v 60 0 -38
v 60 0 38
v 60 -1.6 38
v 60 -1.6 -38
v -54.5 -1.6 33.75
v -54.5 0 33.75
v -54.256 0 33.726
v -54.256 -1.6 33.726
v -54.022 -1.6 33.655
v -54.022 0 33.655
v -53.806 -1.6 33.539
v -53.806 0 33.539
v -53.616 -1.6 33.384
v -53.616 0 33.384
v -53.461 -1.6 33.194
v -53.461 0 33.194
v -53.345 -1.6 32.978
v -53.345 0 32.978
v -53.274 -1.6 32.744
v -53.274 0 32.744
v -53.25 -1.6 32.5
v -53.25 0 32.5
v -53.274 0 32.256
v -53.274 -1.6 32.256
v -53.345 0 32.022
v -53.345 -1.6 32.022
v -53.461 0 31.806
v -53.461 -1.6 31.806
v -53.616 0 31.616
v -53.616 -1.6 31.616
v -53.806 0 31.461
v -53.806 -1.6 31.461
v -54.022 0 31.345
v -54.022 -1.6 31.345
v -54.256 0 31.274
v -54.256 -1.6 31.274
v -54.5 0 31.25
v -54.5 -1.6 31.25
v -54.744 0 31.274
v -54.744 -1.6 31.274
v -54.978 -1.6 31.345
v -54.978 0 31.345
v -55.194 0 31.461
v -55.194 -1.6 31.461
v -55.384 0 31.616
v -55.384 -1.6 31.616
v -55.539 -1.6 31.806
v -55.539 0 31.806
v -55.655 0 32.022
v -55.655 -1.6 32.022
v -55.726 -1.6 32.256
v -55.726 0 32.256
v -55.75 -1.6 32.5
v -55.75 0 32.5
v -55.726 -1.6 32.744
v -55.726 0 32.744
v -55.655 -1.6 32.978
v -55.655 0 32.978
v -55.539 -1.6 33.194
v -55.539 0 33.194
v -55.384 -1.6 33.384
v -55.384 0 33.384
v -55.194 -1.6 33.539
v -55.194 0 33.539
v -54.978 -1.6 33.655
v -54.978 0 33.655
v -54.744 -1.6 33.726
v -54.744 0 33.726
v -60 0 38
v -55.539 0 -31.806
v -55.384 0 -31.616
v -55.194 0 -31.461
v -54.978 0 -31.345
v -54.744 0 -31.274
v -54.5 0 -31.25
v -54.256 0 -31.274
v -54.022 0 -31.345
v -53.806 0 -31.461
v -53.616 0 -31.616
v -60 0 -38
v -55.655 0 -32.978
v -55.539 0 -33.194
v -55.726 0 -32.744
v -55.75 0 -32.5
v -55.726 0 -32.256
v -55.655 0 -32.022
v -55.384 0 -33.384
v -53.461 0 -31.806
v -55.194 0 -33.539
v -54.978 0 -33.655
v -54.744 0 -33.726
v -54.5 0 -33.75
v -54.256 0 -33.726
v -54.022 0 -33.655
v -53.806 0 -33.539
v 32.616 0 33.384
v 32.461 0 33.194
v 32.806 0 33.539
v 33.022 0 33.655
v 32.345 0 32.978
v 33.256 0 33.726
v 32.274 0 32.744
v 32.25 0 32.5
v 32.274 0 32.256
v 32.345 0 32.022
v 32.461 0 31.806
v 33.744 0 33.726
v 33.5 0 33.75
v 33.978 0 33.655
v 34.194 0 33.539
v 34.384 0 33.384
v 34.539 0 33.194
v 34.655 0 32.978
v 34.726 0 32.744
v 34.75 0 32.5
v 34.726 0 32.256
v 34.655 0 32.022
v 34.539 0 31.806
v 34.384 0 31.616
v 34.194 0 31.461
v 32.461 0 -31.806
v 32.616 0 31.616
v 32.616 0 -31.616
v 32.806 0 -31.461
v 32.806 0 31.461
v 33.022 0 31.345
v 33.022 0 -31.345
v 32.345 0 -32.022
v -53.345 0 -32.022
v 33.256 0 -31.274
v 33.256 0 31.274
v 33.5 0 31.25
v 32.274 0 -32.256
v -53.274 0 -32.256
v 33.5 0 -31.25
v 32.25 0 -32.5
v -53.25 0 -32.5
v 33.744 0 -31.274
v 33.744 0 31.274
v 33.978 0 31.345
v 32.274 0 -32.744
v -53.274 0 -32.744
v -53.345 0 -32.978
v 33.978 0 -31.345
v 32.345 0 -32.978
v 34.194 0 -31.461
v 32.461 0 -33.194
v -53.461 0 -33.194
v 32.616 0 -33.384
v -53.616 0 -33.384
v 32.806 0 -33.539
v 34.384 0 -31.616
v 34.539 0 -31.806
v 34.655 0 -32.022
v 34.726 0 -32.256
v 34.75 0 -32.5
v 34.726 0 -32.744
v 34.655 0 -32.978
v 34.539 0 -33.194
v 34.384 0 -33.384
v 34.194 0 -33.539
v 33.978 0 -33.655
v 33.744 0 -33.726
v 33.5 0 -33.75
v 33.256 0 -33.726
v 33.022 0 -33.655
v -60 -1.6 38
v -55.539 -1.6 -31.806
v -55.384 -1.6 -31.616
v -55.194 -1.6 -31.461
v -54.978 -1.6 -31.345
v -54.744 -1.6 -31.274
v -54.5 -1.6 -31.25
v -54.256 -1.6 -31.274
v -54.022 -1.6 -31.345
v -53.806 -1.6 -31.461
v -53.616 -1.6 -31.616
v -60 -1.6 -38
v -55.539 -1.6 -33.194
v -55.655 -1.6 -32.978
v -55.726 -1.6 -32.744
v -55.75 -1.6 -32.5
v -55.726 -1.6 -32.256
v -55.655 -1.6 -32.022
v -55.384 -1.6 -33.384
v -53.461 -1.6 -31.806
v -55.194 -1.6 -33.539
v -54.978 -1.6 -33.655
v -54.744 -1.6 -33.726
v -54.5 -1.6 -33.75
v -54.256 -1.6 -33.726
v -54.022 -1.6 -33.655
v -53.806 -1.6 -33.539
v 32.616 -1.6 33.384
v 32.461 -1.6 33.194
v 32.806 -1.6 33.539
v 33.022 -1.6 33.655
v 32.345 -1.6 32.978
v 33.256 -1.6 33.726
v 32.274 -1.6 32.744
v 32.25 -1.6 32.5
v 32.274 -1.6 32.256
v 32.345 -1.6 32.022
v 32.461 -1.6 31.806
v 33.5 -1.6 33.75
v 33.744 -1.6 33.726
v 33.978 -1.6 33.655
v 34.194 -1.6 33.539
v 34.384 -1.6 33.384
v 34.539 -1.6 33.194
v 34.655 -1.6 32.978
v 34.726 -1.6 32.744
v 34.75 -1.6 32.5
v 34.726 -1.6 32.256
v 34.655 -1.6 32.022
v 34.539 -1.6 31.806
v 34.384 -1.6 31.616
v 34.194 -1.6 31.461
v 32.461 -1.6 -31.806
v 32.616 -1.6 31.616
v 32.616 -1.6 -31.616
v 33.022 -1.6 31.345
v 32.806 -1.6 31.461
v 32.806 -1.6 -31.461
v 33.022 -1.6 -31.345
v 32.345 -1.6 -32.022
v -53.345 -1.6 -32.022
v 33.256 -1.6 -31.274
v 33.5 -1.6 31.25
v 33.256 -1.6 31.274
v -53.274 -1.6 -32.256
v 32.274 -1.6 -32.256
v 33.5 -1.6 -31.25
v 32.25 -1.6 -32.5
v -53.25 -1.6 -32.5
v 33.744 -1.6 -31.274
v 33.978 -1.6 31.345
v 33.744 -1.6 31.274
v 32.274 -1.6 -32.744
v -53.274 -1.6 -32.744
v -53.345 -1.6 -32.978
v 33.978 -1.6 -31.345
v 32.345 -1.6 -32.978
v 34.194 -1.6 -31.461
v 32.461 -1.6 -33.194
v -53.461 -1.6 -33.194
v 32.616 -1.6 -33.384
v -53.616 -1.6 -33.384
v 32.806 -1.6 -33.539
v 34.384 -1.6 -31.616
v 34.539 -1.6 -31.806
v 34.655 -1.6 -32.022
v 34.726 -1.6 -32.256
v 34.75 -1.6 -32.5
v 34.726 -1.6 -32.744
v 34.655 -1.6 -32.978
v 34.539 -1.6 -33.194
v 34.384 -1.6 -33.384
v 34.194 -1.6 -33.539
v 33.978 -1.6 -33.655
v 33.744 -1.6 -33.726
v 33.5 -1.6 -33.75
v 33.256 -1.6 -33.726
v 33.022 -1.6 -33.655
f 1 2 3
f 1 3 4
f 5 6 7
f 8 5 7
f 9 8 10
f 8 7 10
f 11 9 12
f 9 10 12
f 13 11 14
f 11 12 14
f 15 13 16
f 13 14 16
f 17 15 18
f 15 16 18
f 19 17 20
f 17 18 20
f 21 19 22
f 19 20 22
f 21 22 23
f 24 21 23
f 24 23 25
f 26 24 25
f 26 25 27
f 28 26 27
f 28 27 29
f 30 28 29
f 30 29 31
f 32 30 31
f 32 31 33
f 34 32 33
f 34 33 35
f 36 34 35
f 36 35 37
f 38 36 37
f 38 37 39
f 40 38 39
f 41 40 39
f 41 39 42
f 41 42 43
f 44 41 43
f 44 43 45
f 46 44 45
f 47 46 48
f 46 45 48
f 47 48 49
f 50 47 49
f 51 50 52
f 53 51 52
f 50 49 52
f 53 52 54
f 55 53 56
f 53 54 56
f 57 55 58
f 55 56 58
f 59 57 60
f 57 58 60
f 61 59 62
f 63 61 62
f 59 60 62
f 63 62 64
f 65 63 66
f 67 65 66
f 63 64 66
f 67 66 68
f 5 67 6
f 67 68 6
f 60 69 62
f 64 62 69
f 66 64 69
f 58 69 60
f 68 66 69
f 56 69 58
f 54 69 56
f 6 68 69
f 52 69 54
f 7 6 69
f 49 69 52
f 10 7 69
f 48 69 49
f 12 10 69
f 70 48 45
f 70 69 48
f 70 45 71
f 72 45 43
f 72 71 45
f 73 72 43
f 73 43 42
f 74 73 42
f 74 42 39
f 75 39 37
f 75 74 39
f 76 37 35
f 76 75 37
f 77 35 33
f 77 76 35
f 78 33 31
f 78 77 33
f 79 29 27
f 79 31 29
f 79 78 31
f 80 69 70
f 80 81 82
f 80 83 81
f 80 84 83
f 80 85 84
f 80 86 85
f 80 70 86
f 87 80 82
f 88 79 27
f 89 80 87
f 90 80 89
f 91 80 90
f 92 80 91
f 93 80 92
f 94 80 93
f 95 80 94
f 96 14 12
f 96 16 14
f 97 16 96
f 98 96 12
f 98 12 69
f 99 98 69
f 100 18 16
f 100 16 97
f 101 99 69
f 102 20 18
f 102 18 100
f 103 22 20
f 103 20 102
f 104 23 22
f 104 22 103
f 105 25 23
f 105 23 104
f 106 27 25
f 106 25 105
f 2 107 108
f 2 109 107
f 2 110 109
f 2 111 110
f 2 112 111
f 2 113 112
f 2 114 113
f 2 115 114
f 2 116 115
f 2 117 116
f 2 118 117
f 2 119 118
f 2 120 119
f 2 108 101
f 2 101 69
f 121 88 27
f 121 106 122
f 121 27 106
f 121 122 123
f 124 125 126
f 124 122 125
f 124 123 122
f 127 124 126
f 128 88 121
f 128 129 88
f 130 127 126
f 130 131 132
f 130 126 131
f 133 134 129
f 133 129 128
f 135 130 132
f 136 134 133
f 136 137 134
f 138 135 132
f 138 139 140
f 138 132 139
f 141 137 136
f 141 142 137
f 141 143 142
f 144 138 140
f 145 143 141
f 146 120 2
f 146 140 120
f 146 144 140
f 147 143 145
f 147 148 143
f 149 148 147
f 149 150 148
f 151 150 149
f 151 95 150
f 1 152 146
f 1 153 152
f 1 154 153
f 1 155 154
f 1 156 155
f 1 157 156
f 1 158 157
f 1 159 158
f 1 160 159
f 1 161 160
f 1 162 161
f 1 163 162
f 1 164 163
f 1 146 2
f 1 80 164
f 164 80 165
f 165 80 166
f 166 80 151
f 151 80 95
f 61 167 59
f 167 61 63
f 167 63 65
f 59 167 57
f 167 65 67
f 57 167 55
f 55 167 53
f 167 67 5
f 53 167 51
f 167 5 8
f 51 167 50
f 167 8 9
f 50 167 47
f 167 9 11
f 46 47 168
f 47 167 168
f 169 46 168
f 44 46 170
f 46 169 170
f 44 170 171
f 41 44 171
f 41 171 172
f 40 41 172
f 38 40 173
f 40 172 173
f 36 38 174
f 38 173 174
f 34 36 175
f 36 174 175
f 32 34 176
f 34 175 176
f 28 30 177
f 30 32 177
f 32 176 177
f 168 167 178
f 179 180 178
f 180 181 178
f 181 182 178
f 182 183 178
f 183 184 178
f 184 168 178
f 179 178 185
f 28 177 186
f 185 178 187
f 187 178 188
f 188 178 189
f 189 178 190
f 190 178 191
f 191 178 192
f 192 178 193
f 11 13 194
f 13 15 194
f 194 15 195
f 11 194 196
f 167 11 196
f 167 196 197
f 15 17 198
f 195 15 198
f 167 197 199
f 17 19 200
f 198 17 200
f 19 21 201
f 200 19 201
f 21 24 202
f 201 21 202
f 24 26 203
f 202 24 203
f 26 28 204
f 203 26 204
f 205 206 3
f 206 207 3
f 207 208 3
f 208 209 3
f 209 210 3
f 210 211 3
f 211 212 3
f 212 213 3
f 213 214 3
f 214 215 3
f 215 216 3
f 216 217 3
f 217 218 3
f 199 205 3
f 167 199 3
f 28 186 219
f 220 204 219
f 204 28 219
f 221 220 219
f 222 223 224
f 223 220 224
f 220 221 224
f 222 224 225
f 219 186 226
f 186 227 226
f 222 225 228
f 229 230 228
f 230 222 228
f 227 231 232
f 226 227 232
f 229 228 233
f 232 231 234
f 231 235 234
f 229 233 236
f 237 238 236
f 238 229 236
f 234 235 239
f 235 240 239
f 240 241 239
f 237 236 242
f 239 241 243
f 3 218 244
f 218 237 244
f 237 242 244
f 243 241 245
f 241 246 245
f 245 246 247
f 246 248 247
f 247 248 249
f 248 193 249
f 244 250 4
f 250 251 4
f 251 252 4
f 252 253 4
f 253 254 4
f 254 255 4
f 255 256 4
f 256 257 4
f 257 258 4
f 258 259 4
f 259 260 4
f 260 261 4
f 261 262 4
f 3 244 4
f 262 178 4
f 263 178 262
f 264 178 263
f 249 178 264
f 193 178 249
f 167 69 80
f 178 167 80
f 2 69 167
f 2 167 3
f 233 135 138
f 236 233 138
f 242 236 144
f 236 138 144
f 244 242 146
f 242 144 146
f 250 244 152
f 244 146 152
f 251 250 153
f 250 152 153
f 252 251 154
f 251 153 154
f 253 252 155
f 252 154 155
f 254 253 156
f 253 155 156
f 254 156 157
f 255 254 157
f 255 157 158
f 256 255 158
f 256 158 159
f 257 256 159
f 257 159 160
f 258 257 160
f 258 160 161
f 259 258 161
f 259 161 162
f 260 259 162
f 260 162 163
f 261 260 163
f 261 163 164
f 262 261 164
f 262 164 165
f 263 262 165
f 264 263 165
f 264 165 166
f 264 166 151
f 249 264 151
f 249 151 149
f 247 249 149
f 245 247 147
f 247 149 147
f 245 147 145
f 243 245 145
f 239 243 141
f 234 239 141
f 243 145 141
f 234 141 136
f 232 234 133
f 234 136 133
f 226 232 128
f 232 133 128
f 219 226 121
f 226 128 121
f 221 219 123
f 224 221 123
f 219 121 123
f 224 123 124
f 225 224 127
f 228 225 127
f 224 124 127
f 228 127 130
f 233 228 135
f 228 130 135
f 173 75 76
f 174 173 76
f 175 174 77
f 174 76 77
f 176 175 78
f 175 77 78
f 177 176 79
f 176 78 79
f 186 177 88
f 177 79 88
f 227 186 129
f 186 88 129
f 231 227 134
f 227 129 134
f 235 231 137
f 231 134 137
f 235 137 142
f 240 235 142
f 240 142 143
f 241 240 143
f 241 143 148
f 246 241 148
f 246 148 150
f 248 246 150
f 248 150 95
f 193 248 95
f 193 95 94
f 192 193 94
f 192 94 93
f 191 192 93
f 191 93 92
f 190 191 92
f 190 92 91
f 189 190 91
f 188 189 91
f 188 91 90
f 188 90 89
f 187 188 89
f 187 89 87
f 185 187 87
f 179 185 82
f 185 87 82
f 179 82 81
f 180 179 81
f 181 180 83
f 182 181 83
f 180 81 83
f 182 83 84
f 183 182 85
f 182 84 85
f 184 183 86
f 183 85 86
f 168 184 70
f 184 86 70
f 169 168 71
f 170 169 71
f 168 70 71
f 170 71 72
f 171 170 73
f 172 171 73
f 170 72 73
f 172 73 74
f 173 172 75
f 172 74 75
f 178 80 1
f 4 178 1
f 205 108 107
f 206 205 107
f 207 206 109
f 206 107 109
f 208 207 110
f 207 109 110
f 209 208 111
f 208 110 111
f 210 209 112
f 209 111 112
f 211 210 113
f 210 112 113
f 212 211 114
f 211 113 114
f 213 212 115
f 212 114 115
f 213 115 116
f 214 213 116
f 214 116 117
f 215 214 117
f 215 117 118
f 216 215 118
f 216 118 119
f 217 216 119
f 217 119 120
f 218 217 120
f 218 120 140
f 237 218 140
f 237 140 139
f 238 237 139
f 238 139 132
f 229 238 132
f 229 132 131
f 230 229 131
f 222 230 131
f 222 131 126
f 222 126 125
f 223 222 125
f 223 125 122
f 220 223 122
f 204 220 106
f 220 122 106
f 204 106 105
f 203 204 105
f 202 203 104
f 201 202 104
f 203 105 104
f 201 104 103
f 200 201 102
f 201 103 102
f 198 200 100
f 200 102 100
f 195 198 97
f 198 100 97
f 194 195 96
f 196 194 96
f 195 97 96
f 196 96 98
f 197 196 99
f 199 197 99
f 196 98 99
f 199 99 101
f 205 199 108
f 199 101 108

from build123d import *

# Parameters (mm, degrees)
SKETCH1_W           = 120
SKETCH1_H           = 76
BOSS_EXTRUDE1_DEPTH = 1.6
SKETCH2_R           = 1.25
CUT_EXTRUDE1_DEPTH  = 72.039144139


with BuildPart() as part:
    # Sketch1 → Boss-Extrude1 (new body)
    with BuildSketch(Plane(origin=(0, 0, 0), x_dir=(1, 0, 0), z_dir=(0, 1, 0))):
        Rectangle(SKETCH1_W, SKETCH1_H)
    extrude(amount=-BOSS_EXTRUDE1_DEPTH)

    # Sketch2 → Cut-Extrude1 (cut, through all)
    with BuildSketch(Plane(origin=(0, 0, 0), x_dir=(1, 0, 0), z_dir=(0, 1, 0))):
        with Locations(Location((-54.5, 32.5, 0), (0, 0, 270))):
            Circle(SKETCH2_R)
        with Locations(Location((-54.5, -32.5, 0), (0, 0, 270))):
            Circle(SKETCH2_R)
        with Locations(Location((33.5, 32.5, 0), (0, 0, 270))):
            Circle(SKETCH2_R)
        with Locations(Location((33.5, -32.5, 0), (0, 0, 270))):
            Circle(SKETCH2_R)
    extrude(amount=-CUT_EXTRUDE1_DEPTH, mode=Mode.SUBTRACT)


solid = part.part
